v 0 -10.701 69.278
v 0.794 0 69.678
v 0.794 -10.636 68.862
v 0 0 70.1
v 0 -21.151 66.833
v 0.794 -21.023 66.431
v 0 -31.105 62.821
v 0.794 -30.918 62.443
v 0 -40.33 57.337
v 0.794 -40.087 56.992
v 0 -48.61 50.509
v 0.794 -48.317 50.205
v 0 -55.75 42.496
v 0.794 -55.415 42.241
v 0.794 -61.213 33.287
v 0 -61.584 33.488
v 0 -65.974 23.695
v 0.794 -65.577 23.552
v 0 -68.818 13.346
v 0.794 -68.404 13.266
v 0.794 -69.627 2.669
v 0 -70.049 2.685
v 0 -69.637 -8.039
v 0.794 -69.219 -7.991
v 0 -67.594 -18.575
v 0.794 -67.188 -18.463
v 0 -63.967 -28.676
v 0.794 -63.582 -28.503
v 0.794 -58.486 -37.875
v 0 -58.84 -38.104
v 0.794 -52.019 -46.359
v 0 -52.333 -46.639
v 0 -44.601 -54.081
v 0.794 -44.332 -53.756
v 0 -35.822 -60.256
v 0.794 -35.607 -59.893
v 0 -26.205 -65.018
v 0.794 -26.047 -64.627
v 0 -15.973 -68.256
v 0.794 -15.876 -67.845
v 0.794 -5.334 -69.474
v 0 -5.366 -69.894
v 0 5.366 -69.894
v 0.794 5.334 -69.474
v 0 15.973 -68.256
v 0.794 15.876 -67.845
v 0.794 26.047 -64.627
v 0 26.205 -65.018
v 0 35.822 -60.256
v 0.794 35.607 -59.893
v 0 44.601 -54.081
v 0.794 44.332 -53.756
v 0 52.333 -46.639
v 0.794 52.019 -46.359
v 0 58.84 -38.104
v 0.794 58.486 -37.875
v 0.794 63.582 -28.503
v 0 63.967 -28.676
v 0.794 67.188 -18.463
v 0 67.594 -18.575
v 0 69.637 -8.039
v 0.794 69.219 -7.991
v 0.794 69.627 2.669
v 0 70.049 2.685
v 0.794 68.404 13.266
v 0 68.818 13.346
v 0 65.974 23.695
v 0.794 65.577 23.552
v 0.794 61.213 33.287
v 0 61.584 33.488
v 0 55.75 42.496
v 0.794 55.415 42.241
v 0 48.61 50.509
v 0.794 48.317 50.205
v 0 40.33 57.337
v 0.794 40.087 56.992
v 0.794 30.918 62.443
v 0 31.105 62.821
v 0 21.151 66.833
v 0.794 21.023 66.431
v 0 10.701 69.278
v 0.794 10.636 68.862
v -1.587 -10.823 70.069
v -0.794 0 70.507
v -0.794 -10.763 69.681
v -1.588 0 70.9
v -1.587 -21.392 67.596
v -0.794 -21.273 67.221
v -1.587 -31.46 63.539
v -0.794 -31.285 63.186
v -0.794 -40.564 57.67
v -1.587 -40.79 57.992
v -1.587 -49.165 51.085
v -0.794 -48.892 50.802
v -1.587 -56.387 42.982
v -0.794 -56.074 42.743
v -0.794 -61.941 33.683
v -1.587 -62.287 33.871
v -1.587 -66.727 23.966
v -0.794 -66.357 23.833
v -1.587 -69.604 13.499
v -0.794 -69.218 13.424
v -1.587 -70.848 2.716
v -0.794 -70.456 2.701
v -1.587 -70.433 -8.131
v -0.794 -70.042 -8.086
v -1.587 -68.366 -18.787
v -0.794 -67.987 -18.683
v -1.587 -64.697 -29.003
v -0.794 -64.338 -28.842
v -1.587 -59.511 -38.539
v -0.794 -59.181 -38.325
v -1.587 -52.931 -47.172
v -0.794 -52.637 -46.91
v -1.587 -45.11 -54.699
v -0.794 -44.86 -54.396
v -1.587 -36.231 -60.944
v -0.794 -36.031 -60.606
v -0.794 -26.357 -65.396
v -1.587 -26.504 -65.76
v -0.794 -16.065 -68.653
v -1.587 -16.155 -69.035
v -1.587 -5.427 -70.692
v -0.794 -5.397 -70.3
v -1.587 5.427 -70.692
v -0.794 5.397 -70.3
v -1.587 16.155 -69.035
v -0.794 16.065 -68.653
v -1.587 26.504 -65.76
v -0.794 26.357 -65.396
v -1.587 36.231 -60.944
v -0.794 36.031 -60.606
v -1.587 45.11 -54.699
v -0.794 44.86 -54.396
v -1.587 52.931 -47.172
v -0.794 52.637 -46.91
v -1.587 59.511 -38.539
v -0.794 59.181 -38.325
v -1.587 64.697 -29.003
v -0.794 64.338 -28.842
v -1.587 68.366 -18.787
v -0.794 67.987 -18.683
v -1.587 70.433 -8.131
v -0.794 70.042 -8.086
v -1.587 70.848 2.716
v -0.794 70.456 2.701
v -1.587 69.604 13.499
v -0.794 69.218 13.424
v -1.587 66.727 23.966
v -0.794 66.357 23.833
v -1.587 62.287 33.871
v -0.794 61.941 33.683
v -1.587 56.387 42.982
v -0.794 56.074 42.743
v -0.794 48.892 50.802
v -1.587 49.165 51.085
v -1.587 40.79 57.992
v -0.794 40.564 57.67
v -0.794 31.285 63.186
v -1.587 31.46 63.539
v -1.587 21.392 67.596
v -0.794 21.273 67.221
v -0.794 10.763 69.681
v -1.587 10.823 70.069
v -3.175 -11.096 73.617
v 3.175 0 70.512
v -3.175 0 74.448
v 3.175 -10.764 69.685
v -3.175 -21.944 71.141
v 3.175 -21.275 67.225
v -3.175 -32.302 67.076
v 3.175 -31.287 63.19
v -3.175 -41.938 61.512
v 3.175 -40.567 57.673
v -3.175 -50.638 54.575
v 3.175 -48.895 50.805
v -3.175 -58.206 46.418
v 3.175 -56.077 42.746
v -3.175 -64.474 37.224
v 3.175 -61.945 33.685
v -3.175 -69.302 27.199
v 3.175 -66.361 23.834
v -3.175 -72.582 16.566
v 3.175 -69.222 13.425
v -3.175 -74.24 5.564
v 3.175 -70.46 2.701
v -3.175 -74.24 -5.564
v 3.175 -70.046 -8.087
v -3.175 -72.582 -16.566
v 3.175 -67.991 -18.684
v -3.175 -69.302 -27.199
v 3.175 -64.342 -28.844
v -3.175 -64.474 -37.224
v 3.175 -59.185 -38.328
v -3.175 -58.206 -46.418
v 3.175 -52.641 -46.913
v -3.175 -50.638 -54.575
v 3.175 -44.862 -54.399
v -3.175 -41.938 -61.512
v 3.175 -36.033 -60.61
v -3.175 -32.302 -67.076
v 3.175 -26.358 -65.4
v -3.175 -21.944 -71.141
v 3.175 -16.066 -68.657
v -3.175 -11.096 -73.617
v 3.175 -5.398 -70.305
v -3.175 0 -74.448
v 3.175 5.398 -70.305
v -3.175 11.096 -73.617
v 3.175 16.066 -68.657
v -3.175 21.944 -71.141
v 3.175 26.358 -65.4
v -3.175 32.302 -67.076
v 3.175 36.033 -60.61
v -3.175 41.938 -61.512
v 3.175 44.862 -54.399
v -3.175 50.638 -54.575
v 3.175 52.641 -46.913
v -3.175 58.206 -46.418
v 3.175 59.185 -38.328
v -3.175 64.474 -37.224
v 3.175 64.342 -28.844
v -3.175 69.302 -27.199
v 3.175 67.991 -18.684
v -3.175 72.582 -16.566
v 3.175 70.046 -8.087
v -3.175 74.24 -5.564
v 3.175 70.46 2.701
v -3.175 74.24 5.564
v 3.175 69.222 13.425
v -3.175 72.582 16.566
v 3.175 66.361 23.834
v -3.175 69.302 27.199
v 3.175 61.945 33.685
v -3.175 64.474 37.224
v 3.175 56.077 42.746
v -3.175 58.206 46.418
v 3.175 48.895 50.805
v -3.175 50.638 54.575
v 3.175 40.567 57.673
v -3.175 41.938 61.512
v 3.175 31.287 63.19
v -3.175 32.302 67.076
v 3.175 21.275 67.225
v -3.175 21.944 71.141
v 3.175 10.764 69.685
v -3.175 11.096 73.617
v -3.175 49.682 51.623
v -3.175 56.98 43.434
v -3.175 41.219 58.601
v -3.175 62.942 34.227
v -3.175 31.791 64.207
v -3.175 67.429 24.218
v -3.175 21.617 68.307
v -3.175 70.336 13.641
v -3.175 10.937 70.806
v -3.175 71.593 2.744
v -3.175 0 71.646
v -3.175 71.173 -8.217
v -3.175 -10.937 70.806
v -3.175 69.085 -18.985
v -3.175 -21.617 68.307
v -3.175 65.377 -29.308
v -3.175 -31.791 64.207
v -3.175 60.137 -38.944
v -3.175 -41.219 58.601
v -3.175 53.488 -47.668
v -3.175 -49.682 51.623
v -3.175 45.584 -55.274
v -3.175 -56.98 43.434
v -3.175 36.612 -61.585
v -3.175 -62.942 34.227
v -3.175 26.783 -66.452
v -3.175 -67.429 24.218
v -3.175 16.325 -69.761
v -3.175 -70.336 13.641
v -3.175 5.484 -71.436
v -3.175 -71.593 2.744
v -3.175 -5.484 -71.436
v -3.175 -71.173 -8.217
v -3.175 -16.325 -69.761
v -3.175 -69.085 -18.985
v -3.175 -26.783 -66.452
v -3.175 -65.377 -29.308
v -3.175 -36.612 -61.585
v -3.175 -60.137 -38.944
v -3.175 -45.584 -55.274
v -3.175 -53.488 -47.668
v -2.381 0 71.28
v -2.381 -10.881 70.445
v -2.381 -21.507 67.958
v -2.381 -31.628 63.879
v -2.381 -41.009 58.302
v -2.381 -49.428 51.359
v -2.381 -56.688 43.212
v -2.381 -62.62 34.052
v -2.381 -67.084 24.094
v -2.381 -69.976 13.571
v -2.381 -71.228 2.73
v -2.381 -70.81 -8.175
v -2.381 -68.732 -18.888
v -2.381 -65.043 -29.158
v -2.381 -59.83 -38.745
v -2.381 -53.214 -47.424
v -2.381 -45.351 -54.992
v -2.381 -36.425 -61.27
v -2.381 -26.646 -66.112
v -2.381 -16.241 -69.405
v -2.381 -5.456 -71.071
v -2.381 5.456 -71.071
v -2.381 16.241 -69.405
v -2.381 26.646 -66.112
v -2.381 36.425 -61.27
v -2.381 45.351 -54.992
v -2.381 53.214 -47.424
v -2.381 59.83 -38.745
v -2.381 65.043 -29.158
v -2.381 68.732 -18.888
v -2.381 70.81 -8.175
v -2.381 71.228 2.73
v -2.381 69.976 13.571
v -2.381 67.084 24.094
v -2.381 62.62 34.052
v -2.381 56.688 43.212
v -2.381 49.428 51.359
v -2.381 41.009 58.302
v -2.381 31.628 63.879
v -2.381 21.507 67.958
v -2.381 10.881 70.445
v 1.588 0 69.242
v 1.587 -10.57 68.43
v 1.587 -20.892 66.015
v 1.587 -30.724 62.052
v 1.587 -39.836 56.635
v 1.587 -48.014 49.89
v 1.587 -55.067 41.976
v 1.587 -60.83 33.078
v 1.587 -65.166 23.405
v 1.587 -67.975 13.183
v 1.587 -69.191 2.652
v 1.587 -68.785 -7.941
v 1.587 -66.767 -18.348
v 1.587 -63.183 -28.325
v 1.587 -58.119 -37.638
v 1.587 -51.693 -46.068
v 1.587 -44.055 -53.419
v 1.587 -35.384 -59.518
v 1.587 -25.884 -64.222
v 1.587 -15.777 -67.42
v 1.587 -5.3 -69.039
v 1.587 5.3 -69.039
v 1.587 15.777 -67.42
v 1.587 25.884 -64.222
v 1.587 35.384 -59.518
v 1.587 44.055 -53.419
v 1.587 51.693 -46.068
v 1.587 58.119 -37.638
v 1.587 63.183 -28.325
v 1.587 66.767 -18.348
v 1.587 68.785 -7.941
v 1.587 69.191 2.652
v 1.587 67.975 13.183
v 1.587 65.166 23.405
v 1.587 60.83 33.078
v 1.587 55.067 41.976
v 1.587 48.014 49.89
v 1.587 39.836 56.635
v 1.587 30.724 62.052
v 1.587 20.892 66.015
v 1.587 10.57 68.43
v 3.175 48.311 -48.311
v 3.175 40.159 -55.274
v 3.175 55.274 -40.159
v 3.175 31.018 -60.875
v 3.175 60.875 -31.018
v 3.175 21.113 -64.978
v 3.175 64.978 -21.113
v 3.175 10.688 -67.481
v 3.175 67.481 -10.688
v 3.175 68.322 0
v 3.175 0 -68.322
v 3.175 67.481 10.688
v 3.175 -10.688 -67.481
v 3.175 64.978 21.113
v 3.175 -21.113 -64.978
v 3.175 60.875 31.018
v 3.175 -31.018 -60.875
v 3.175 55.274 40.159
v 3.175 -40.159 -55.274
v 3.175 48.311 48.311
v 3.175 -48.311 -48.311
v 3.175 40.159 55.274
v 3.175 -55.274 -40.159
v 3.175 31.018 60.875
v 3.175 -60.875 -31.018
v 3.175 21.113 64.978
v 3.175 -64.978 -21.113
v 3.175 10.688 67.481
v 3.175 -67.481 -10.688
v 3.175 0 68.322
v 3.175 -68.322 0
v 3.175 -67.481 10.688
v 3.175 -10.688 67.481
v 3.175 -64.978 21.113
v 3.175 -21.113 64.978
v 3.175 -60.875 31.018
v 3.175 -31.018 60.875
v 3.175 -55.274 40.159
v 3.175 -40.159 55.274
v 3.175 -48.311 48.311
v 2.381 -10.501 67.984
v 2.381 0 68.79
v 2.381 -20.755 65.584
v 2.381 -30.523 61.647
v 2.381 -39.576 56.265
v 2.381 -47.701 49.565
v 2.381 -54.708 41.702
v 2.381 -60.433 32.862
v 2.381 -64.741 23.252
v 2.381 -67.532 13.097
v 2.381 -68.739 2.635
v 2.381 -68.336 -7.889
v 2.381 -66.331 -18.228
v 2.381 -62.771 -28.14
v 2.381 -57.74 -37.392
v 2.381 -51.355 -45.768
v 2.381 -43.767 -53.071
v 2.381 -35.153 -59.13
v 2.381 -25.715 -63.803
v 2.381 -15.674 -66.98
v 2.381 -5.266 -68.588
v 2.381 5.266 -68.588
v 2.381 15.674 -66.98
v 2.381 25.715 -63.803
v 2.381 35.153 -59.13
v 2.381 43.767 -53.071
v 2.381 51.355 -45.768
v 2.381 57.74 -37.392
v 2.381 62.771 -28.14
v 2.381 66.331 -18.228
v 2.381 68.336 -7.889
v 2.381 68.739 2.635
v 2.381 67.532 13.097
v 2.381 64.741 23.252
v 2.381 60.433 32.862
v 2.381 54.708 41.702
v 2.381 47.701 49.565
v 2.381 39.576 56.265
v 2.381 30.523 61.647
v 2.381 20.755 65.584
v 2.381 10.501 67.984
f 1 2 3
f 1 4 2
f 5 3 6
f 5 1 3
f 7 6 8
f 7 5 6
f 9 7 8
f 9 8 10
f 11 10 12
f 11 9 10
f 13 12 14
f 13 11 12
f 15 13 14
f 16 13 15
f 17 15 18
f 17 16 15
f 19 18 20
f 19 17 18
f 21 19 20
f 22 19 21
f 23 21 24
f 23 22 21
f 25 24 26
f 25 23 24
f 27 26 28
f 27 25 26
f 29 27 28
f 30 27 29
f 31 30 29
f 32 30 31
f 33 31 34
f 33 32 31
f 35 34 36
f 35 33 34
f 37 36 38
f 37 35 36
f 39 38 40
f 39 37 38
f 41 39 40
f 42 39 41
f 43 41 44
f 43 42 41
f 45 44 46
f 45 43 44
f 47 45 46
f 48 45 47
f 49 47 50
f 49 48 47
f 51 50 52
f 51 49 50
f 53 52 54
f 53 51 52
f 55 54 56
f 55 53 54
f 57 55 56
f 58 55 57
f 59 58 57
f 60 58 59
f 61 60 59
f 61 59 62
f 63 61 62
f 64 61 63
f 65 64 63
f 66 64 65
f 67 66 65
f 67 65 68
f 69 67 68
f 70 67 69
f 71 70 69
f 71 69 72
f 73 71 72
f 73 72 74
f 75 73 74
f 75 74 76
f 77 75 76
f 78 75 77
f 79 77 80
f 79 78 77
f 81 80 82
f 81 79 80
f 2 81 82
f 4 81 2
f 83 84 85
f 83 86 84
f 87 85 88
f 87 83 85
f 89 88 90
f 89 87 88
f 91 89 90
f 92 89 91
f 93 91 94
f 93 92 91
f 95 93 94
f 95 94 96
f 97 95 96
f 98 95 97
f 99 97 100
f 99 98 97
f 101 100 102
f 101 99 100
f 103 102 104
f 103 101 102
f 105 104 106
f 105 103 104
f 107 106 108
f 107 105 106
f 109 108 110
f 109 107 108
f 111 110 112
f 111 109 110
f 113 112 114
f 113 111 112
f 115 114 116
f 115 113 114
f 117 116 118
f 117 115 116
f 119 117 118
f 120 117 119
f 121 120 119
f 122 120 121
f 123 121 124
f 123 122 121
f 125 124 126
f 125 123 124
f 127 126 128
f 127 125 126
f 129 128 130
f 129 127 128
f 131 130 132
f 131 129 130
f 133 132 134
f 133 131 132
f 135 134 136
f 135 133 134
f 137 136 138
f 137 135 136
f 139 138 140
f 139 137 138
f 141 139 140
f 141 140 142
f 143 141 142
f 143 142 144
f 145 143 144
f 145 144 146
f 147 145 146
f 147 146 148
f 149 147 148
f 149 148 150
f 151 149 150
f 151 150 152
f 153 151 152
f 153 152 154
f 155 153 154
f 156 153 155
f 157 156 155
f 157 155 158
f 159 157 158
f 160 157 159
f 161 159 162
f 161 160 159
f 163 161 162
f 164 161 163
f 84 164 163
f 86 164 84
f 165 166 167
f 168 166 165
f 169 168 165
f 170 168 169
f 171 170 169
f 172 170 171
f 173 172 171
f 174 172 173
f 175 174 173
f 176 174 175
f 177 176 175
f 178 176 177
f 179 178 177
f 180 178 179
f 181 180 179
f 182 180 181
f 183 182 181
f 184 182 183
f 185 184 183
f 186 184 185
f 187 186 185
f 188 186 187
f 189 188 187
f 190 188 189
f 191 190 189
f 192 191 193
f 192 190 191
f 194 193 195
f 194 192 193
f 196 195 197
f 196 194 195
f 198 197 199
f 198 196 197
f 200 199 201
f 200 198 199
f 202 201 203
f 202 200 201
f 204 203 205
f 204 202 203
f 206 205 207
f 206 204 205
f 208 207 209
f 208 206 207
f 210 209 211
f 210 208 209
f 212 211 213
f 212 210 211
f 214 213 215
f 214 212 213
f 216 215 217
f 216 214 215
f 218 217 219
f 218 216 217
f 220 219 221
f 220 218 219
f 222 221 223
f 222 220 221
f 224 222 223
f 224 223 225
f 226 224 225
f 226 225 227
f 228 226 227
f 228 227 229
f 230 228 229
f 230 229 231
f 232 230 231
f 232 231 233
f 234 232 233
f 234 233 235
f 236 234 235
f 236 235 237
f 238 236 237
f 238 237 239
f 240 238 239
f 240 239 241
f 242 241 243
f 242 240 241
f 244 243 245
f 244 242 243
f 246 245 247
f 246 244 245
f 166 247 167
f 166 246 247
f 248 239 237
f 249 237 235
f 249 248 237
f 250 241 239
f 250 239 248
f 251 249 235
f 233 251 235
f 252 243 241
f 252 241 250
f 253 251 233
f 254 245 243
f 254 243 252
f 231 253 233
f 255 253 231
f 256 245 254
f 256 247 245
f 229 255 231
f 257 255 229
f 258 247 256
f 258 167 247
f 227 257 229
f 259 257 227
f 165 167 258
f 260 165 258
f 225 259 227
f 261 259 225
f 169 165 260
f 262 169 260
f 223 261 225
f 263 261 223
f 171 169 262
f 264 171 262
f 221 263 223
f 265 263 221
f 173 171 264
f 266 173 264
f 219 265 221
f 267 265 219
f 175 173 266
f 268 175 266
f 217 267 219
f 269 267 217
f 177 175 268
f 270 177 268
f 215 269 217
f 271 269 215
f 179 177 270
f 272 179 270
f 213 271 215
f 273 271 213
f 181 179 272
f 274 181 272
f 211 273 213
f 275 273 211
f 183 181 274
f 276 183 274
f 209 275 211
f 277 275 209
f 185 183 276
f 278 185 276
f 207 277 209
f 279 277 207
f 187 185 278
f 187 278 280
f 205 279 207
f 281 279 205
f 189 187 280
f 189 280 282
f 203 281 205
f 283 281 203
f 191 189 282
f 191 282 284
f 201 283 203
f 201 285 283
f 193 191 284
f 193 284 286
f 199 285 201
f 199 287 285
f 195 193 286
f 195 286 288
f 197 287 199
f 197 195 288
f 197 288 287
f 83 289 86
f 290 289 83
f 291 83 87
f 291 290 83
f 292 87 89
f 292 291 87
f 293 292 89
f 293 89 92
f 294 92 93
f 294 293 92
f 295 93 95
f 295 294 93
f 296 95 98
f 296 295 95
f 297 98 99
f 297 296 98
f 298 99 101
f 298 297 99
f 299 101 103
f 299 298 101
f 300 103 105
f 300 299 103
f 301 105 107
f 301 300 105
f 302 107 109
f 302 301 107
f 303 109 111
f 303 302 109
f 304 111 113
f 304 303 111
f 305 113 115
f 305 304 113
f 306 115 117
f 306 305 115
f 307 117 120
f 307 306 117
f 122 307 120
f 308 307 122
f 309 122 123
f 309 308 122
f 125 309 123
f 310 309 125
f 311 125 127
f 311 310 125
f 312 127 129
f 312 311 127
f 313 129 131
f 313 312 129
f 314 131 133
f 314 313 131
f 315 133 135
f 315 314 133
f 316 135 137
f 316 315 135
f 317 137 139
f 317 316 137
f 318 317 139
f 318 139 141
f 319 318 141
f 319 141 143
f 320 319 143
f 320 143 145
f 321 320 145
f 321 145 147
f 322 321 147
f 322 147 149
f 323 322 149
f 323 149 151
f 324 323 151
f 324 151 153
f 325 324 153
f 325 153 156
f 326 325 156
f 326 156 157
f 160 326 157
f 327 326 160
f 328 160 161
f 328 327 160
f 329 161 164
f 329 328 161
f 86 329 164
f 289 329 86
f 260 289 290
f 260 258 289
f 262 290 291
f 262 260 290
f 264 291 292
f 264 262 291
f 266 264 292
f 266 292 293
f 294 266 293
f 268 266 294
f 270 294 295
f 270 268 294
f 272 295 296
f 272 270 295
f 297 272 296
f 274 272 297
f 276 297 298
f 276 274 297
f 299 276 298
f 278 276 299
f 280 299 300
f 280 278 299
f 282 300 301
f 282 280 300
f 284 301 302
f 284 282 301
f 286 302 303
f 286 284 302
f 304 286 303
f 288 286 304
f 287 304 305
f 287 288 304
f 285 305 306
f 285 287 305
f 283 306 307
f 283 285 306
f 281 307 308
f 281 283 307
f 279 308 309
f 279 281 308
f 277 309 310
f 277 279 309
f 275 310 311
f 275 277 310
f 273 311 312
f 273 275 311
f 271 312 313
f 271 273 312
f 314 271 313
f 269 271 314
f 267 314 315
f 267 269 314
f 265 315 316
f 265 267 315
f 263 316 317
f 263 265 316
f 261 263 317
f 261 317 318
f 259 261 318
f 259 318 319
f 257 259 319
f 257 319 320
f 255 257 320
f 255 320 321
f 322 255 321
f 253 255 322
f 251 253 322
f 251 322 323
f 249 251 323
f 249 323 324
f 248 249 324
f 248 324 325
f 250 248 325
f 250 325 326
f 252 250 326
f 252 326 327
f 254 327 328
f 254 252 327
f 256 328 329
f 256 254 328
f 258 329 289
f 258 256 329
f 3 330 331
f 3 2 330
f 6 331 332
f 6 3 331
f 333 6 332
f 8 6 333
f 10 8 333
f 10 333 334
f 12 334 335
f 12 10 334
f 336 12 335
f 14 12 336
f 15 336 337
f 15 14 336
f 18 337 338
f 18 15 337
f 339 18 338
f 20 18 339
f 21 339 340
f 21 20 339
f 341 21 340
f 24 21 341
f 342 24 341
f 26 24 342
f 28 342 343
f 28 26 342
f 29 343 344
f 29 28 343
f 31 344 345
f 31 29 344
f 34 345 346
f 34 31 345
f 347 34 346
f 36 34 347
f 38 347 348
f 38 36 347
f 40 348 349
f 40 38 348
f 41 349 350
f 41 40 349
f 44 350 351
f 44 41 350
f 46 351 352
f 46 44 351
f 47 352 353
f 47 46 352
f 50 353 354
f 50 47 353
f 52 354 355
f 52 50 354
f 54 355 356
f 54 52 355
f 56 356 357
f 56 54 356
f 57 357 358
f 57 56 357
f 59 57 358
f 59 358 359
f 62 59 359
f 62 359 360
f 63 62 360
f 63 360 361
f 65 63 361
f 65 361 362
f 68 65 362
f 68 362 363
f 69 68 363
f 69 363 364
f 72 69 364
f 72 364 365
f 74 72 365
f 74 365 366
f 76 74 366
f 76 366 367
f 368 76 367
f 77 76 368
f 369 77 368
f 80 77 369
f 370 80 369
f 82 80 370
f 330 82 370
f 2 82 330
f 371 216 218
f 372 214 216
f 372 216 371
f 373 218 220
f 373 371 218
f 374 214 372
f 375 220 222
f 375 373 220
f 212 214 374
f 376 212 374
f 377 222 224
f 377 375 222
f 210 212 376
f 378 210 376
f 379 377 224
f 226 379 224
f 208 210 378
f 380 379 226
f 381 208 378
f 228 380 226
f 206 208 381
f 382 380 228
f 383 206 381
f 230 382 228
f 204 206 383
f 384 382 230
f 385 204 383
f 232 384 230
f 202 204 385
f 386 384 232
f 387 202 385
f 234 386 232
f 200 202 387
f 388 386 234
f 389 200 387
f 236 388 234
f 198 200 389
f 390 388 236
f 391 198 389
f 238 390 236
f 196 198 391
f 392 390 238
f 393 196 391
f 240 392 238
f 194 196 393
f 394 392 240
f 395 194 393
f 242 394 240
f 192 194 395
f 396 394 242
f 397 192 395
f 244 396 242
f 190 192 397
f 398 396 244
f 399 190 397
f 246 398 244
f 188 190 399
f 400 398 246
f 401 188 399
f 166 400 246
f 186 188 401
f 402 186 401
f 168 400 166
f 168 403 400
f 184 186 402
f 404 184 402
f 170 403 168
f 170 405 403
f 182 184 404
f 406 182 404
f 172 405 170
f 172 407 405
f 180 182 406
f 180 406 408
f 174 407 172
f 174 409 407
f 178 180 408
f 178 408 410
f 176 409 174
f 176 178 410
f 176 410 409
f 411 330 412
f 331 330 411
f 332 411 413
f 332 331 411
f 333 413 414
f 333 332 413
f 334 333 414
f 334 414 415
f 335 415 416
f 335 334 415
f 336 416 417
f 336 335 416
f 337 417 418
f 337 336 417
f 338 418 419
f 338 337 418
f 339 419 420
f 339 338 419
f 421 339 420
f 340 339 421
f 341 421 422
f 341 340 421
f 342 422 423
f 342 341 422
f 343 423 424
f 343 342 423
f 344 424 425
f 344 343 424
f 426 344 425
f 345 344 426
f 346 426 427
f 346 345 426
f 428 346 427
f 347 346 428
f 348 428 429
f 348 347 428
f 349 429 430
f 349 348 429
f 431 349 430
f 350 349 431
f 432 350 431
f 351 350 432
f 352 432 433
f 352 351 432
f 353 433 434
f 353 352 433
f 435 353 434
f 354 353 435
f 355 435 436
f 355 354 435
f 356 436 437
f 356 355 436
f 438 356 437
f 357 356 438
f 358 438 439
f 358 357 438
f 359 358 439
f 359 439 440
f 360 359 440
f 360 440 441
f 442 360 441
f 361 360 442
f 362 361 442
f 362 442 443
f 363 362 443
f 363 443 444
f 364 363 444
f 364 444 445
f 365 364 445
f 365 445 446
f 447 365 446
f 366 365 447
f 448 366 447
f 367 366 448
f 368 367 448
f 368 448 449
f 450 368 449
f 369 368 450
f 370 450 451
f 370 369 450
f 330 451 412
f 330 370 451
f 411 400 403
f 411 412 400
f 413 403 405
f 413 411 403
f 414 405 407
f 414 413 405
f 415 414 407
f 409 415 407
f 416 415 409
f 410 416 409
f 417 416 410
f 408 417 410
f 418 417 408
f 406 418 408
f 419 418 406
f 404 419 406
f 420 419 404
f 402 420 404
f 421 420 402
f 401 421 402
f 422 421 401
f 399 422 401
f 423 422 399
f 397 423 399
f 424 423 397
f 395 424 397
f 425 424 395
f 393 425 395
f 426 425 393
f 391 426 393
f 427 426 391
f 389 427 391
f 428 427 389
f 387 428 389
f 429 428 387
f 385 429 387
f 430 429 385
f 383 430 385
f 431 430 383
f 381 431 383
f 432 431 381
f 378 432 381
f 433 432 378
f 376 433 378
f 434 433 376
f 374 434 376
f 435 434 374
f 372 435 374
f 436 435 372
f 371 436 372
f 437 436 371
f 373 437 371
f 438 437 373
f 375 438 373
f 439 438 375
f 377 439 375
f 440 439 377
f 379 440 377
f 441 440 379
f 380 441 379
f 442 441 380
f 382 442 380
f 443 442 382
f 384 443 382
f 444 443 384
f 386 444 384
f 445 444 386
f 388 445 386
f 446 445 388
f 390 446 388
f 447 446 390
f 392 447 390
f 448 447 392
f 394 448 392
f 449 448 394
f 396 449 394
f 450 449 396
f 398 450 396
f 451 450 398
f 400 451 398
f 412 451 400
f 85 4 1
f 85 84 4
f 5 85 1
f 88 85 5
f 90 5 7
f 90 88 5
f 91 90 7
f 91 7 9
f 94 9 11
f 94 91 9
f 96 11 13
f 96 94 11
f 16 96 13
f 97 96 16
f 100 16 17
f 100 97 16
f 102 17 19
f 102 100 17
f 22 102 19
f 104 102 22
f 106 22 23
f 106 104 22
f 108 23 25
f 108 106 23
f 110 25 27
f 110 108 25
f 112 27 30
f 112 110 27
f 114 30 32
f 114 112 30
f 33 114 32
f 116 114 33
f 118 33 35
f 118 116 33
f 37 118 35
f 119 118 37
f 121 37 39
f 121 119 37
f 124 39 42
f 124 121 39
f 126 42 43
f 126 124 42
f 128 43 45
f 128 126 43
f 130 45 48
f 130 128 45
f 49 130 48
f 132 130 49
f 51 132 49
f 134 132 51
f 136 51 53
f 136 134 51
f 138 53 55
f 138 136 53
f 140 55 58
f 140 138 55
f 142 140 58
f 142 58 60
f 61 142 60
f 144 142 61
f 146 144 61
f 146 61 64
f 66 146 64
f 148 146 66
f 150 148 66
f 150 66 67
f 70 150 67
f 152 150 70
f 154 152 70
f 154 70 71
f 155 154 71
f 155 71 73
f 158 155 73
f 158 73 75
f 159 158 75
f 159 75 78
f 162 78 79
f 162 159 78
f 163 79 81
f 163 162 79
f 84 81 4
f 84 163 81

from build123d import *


with BuildPart() as part:
    # Bottle_Liner_Seat Sketch → Bottle_Liner_Seat (revolve)
    with BuildSketch(Plane.XY):
        Polygon((3.175, 68.322086283), (2.38125, 68.789822501), (1.5875, 69.241731249), (0.79375, 69.678304925), (0, 70.1), (-0.79375, 70.507240342), (-1.5875, 70.900420139), (-2.38125, 71.279906477), (-3.175, 71.646041639), (-3.175, 74.4485), (3.175, 70.5115), align=None)
    revolve(axis=Axis((-300, 0, 0), (1, 0, 0)))


solid = part.part
